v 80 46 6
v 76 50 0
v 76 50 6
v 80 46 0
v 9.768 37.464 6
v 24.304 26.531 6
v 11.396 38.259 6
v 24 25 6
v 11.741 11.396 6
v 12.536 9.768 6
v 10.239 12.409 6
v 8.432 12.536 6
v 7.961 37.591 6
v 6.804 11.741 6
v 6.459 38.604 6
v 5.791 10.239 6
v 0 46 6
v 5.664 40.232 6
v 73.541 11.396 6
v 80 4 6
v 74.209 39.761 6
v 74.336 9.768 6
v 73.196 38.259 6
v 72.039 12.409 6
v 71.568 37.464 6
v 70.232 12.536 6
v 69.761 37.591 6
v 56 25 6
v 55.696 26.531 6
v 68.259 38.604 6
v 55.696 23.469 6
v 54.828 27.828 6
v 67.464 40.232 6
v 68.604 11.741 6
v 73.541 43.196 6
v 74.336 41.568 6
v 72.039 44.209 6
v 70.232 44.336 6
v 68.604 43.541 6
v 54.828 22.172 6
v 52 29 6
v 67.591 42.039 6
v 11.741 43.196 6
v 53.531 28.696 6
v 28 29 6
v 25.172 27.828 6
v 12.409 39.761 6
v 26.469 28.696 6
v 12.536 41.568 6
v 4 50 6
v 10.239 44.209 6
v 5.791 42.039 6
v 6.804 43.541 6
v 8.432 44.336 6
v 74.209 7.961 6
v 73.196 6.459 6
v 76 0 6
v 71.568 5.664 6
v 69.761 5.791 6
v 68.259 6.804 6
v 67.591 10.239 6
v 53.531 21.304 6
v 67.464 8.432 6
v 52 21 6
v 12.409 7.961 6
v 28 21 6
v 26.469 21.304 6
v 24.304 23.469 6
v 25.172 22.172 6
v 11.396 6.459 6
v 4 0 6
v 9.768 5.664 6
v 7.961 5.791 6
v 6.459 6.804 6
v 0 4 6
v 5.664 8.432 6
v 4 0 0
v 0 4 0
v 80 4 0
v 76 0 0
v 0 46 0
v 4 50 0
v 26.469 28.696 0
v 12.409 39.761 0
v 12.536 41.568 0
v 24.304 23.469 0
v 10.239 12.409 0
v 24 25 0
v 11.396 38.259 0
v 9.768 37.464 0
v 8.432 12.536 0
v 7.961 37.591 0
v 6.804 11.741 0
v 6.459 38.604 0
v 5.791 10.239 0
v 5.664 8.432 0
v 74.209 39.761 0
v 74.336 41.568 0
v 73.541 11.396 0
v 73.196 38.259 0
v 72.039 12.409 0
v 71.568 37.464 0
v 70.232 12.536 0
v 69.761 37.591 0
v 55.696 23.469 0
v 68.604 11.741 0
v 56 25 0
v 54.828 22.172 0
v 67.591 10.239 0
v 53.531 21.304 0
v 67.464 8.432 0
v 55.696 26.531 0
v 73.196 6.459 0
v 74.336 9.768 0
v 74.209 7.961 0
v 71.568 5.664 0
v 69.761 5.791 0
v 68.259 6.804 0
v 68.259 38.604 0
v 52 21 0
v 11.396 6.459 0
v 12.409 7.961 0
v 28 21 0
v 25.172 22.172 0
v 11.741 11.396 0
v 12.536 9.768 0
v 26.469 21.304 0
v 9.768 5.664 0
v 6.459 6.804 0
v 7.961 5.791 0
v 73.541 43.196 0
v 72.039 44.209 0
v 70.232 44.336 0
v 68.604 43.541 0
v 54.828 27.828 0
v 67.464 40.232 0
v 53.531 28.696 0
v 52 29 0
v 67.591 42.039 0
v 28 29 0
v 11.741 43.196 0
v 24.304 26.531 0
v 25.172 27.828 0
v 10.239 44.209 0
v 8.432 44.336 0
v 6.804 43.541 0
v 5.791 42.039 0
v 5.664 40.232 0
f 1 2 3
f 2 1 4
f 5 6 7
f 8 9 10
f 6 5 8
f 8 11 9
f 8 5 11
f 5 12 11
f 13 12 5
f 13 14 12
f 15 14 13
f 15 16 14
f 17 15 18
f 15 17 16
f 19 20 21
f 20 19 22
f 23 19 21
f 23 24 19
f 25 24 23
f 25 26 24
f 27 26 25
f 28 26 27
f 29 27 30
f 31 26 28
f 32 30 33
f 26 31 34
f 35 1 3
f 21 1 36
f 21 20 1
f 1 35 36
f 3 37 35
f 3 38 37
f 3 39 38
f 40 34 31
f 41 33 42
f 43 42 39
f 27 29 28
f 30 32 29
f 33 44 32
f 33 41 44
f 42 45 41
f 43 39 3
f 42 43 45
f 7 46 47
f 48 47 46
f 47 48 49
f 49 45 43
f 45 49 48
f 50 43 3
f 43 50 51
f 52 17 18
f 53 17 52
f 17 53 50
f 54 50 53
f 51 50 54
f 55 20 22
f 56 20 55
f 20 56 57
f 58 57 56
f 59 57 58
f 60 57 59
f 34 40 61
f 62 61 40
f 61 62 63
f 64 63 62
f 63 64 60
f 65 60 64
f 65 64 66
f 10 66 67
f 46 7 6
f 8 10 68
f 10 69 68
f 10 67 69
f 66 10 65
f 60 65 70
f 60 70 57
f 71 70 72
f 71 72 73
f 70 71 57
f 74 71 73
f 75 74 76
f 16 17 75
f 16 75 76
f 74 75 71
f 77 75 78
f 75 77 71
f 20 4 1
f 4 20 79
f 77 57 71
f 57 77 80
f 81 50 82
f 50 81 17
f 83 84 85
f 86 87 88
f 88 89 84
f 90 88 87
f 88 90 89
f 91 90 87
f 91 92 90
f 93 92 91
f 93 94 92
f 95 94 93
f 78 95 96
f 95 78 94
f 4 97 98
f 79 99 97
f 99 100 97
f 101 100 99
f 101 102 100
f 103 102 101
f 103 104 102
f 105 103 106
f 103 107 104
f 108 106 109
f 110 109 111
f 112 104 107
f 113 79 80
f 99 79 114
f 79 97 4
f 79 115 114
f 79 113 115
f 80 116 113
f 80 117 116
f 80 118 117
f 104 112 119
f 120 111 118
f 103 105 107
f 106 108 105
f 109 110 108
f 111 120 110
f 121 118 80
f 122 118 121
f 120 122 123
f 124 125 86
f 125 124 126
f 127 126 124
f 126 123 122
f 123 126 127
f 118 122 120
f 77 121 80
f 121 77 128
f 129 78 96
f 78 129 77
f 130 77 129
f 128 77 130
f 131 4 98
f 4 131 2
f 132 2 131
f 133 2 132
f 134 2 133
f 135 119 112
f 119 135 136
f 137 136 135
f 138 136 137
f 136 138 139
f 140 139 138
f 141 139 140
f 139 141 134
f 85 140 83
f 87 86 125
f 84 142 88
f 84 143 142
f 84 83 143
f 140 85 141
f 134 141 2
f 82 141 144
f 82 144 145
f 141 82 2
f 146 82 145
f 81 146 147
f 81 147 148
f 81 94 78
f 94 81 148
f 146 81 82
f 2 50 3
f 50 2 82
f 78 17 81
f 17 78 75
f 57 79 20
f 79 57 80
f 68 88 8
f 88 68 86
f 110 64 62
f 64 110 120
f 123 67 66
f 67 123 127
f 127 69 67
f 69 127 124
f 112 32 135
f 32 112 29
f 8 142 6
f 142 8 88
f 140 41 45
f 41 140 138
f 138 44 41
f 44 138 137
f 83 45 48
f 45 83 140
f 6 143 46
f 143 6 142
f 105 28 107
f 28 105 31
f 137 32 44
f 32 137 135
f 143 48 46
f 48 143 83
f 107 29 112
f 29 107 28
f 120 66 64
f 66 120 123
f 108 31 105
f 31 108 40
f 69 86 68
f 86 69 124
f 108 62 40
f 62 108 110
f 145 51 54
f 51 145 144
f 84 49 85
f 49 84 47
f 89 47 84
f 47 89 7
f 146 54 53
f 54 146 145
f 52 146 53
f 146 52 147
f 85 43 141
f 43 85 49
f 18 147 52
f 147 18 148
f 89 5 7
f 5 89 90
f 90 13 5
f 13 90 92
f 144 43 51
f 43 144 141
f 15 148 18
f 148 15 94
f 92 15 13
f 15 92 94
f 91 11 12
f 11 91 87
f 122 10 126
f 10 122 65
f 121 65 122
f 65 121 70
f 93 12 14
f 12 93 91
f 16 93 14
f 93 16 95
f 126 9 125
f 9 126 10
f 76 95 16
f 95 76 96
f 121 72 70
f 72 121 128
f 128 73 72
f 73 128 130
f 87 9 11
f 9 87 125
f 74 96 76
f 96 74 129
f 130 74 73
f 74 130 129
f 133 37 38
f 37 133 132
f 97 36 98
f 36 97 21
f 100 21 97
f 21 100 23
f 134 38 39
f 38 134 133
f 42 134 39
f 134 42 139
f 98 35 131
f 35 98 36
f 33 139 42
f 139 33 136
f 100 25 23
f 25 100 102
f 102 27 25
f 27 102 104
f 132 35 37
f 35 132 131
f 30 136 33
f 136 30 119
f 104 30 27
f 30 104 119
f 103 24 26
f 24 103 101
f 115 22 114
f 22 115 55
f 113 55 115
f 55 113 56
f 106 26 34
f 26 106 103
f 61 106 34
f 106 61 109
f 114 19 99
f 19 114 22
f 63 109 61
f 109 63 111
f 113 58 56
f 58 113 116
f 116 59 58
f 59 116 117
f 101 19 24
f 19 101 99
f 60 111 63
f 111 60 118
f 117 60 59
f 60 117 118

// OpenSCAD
$fn = 32;

// ----------------------------------------------------------------------
// Bracket plate: slot plate 80 x 50
// ----------------------------------------------------------------------

// --- parameters (mm) ---
hole_r = 3.5;             // bolt hole radius
plate_t = 6;              // plate thickness, Z (extrusion height)
plate_l = 80;             // plate length
plate_w = 50;             // plate width
slot_l = 24;              // slot straight length
slot_r = 4;               // slot end radius

slot_len = slot_l + 2 * slot_r;
slot_w = 2 * slot_r;
hole_d2 = 2 * hole_r;

profile = [[4, 0], [76, 0], [80, 4], [80, 46], [76, 50], [4, 50], [0, 46], [0, 4]];  // primary outline, 8 points, counter clockwise
void_1 = [[52, 21], [53.531, 21.304], [54.828, 22.172], [55.696, 23.469], [56, 25], [55.696, 26.531], [54.828, 27.828], [53.531, 28.696], [52, 29], [28, 29], [26.469, 28.696], [25.172, 27.828], [24.304, 26.531], [24, 25], [24.304, 23.469], [25.172, 22.172], [26.469, 21.304], [28, 21]];  // grip slot, 18 points
void_2 = [[12.536, 41.568], [11.741, 43.196], [10.239, 44.209], [8.432, 44.336], [6.804, 43.541], [5.791, 42.039], [5.664, 40.232], [6.459, 38.604], [7.961, 37.591], [9.768, 37.464], [11.396, 38.259], [12.409, 39.761]];  // corner hole, 12 points
void_3 = [[12.536, 9.768], [11.741, 11.396], [10.239, 12.409], [8.432, 12.536], [6.804, 11.741], [5.791, 10.239], [5.664, 8.432], [6.459, 6.804], [7.961, 5.791], [9.768, 5.664], [11.396, 6.459], [12.409, 7.961]];  // corner hole, 12 points
void_4 = [[74.336, 41.568], [73.541, 43.196], [72.039, 44.209], [70.232, 44.336], [68.604, 43.541], [67.591, 42.039], [67.464, 40.232], [68.259, 38.604], [69.761, 37.591], [71.568, 37.464], [73.196, 38.259], [74.209, 39.761]];  // corner hole, 12 points
void_5 = [[74.336, 9.768], [73.541, 11.396], [72.039, 12.409], [70.232, 12.536], [68.604, 11.741], [67.591, 10.239], [67.464, 8.432], [68.259, 6.804], [69.761, 5.791], [71.568, 5.664], [73.196, 6.459], [74.209, 7.961]];  // corner hole, 12 points

// --- the one profile operation ---
difference() {
  linear_extrude(height = plate_t) polygon(points = profile);
  translate([0, 0, -1])
    linear_extrude(height = plate_t + 2) polygon(points = void_1);
  translate([0, 0, -1])
    linear_extrude(height = plate_t + 2) polygon(points = void_2);
  translate([0, 0, -1])
    linear_extrude(height = plate_t + 2) polygon(points = void_3);
  translate([0, 0, -1])
    linear_extrude(height = plate_t + 2) polygon(points = void_4);
  translate([0, 0, -1])
    linear_extrude(height = plate_t + 2) polygon(points = void_5);
}
